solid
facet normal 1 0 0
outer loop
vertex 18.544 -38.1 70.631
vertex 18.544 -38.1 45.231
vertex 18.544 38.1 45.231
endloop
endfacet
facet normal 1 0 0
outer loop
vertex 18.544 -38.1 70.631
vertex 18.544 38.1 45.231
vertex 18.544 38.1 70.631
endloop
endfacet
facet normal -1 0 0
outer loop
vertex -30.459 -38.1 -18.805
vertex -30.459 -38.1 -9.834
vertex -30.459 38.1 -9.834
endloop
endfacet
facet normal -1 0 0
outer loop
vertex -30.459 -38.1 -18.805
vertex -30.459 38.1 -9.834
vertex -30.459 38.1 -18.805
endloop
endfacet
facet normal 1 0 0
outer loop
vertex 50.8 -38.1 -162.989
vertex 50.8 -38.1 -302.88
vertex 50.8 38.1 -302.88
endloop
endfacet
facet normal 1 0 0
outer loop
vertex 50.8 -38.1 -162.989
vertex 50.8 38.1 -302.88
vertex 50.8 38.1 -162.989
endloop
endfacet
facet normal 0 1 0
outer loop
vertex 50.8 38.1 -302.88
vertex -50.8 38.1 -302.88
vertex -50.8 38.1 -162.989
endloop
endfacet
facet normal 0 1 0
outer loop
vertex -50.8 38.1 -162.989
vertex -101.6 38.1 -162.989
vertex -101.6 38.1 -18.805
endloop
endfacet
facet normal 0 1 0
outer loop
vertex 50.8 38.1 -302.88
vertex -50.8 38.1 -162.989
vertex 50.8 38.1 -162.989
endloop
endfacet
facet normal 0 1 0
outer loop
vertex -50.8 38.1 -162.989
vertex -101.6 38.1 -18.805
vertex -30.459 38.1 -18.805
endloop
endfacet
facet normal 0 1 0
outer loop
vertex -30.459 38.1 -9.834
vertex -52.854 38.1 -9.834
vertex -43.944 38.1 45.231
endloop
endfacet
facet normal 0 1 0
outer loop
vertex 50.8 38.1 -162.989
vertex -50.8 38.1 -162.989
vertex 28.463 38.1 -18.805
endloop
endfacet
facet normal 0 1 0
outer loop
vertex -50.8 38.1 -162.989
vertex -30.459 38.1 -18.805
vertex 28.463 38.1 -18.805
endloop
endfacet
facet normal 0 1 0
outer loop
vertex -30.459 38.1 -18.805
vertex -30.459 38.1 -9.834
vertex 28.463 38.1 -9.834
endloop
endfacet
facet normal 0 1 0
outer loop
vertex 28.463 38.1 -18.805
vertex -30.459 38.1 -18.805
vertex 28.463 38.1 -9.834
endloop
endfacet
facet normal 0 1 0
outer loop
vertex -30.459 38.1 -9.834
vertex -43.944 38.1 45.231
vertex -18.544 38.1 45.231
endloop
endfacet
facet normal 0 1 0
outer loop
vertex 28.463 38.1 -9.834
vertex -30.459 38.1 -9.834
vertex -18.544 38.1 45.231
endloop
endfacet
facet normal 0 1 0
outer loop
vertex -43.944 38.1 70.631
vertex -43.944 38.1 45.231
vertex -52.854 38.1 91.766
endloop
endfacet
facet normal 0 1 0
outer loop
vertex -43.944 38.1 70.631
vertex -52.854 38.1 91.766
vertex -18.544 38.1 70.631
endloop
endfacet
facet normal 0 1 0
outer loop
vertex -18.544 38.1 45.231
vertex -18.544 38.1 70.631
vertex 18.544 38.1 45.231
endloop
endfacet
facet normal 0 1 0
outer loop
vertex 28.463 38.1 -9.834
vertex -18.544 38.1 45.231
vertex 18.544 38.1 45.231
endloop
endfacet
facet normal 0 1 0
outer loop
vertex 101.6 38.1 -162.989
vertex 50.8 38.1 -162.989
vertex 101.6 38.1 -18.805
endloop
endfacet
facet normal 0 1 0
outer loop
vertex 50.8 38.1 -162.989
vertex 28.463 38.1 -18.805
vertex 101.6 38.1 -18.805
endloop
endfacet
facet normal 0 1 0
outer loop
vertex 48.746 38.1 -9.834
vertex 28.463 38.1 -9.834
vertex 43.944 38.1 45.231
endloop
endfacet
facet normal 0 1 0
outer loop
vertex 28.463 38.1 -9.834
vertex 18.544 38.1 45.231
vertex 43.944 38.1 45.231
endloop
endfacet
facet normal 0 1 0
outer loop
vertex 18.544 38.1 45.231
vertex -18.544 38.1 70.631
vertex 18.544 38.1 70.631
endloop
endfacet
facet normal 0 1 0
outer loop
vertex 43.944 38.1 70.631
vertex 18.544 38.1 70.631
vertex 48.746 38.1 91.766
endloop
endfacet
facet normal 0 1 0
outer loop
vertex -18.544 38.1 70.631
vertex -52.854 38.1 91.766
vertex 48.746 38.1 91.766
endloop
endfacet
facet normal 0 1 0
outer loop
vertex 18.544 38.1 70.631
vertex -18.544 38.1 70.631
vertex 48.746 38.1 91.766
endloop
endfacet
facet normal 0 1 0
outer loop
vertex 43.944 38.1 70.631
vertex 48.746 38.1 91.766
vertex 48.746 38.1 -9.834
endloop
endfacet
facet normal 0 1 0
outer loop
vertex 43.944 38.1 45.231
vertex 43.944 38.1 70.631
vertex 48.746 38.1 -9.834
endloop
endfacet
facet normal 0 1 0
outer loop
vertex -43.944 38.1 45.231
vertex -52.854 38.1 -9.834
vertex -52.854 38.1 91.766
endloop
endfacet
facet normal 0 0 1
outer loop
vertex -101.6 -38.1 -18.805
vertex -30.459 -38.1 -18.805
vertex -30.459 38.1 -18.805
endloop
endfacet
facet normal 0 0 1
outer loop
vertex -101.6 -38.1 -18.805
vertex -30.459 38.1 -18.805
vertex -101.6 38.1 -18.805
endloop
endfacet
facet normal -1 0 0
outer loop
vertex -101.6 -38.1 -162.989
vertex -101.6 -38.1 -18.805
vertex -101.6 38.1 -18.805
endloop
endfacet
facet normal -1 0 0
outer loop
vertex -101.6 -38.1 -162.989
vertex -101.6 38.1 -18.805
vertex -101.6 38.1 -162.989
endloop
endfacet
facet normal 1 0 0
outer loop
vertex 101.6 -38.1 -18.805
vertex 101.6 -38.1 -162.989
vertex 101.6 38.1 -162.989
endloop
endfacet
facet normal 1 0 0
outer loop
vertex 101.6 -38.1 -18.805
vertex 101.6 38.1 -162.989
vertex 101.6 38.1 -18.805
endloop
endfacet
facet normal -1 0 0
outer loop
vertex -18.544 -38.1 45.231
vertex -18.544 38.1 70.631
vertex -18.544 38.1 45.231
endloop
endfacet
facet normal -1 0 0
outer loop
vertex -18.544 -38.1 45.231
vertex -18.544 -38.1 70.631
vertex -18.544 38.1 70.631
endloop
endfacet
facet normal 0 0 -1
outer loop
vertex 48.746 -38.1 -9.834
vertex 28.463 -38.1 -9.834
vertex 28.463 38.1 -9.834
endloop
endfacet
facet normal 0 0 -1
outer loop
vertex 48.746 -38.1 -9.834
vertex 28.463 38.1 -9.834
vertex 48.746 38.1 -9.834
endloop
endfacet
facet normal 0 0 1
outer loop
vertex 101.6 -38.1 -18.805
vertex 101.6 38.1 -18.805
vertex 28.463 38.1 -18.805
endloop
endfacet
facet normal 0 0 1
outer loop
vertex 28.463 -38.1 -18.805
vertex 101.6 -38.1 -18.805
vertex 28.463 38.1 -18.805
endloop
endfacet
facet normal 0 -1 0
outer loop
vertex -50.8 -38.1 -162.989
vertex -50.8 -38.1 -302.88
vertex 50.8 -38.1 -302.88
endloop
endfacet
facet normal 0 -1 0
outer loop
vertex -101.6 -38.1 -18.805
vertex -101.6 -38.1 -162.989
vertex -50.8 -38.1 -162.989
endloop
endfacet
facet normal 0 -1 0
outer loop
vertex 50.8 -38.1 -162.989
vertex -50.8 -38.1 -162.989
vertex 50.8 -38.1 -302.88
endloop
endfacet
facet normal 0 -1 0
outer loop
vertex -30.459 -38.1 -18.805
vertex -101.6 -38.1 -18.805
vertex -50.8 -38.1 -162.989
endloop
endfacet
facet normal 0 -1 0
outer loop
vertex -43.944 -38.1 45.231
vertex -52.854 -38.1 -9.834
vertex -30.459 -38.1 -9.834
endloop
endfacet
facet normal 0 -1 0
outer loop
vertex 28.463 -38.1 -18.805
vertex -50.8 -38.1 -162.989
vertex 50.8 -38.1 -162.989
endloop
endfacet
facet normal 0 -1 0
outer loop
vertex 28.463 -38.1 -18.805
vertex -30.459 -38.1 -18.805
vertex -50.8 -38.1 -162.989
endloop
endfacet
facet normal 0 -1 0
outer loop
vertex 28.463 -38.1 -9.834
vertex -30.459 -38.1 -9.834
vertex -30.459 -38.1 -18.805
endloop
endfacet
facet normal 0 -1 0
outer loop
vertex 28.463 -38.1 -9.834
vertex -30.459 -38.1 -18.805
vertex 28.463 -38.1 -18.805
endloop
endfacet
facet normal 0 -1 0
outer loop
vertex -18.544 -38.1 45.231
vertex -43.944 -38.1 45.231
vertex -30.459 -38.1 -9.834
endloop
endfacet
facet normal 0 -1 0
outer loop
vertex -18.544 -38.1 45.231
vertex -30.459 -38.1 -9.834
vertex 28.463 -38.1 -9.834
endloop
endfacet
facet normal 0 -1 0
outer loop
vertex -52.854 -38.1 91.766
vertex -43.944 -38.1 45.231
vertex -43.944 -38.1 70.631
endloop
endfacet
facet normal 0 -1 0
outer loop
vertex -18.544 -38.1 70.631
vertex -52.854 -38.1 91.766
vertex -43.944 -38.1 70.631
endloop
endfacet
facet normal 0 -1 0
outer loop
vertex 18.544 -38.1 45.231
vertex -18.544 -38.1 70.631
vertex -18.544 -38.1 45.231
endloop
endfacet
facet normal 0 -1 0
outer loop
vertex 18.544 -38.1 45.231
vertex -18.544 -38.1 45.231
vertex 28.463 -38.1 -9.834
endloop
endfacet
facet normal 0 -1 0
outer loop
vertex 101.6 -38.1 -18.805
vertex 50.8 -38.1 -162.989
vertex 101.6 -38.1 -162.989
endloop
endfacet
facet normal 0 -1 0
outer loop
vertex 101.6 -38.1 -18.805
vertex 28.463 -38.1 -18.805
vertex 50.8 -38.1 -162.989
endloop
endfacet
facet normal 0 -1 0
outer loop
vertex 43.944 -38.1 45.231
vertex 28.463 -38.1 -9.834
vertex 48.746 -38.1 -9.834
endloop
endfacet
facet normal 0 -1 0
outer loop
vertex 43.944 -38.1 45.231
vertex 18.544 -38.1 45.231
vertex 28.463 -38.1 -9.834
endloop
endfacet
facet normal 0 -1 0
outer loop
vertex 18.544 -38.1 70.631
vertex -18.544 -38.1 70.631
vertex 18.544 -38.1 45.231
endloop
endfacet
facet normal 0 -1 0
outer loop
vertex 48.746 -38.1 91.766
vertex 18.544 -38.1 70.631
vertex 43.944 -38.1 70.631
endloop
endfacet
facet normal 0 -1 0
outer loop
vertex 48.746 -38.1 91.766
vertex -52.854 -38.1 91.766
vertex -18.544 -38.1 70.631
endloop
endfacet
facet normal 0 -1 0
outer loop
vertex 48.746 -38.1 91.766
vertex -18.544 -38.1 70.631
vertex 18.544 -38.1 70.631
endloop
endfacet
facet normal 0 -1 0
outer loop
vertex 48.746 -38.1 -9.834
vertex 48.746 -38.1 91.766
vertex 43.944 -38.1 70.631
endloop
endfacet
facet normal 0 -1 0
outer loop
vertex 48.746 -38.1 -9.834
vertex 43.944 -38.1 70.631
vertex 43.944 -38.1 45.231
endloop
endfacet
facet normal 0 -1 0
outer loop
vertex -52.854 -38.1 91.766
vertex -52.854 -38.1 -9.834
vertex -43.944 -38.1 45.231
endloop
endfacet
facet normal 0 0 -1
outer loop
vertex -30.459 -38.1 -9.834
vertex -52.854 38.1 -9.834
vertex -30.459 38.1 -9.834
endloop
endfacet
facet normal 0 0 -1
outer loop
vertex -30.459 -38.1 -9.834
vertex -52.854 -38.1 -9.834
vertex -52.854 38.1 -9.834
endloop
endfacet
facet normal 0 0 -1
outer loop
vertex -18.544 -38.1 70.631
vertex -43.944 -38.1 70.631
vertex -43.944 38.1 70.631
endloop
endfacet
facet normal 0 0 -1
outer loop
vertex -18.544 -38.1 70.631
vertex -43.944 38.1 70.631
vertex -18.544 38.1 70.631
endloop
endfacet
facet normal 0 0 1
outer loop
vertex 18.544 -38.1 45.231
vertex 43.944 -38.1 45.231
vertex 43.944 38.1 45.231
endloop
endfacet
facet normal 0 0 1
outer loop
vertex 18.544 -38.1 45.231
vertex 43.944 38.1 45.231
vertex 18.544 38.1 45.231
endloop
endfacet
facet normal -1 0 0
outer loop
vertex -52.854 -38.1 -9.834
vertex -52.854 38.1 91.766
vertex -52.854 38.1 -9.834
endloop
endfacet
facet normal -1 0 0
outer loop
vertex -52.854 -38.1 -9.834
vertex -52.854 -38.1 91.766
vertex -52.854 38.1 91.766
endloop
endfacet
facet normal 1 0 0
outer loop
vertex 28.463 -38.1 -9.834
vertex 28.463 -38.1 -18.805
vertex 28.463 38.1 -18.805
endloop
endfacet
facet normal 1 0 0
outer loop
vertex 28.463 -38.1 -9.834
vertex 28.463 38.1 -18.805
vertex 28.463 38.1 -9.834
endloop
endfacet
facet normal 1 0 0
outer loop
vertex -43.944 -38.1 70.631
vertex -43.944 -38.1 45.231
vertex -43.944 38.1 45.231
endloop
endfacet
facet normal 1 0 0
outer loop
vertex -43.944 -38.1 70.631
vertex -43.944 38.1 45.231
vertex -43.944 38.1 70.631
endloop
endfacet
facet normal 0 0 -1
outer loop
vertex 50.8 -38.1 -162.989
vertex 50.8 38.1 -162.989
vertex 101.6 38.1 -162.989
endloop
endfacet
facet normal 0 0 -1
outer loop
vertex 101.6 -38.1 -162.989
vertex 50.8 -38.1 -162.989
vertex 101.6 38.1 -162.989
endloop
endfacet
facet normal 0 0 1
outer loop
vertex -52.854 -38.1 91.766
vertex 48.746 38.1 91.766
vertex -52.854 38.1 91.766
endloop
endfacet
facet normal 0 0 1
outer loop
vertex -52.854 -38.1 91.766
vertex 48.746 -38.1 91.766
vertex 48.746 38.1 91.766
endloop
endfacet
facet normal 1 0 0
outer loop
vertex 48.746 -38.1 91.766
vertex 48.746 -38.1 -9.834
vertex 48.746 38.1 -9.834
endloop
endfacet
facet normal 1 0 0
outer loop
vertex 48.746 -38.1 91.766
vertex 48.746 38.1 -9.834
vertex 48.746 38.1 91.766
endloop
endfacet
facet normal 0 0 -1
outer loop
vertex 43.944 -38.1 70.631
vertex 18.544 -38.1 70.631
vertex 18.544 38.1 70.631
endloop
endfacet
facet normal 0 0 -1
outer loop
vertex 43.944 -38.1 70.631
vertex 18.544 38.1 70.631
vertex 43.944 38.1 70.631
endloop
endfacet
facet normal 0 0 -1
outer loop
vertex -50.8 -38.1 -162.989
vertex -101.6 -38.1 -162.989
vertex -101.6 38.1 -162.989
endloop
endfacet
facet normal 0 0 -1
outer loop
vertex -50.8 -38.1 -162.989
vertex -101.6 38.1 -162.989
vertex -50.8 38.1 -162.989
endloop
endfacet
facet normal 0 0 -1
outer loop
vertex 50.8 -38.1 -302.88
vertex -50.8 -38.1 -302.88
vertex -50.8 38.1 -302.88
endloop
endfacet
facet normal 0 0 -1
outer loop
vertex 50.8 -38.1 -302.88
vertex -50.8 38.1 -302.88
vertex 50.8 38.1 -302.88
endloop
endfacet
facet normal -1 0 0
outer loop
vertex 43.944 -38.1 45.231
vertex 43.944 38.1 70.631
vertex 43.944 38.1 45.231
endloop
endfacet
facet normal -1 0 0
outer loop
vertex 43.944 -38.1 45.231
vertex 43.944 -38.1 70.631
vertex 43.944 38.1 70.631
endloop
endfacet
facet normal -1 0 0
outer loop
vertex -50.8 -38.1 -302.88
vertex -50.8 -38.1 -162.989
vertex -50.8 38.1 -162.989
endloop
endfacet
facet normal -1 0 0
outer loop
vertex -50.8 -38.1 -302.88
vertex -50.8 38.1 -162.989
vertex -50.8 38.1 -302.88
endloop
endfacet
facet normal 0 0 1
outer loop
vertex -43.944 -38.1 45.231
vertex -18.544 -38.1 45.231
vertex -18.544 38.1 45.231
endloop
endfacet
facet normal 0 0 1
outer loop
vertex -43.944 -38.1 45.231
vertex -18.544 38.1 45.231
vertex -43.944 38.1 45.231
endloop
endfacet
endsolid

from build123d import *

# Parameters (mm, degrees)
F0_W     = 58.9215288217
F0_H     = 8.9712000314
F0_H_2   = 1.1887999686
F0_W_2   = 50.8
F0_H_3   = 93.8377175136
F0_H_4   = 50.346628223
F0_H_5   = 109.2197667617
F0_H_6   = 30.6704640388
F1_DEPTH = 38.1


with BuildPart() as f1:
    # F0 (on Front) → F1 (new body, symmetric)
    with BuildSketch(Plane.XZ):
        Polygon((-52.8541674206, 65.5549615622), (-52.8541674206, -9.8338549508), (-30.4587072518, -9.8338549508), (28.4628215698, -9.8338549508), (48.7458325794, -9.8338549508), (48.7458325794, 71.4190080762), (33.4042608738, 71.4190080762), (33.4042608738, 75.9503096342), (8.8818948716, 75.9503096342), (8.8818948716, 71.6855600476), (-20.7048710436, 71.6855600476), (-20.7048710436, 79.6819776297), (-47.3596155643, 79.6819776297), (-47.3596155643, 65.5549615622), align=None)
        Polygon((-18.5442172647, 45.2312529087), (-43.9442172647, 45.2312529087), (-43.9442172647, 70.6312529087), (-31.2442172647, 70.6312529087), (-18.5442172647, 70.6312529087), (-18.5442172647, 53.8268759847), align=None, mode=Mode.SUBTRACT)
        Polygon((43.9442172647, 45.2312529087), (18.5442172647, 45.2312529087), (18.5442172647, 70.6312529087), (31.2442172647, 70.6312529087), (43.9442172647, 70.6312529087), (43.9442172647, 53.8268759847), align=None, mode=Mode.SUBTRACT)
        with Locations((-0.997942841, -14.3194549665)):
            Rectangle(F0_W, F0_H)
        Polygon((-52.8541674206, 91.7661450492), (-52.8541674206, 65.5549615622), (-47.3596155643, 65.5549615622), (-47.3596155643, 79.6819776297), (-20.7048710436, 79.6819776297), (-20.7048710436, 71.6855600476), (8.8818948716, 71.6855600476), (8.8818948716, 75.9503096342), (33.4042608738, 75.9503096342), (33.4042608738, 71.4190080762), (48.7458325794, 71.4190080762), (48.7458325794, 91.7661450492), align=None)
        with Locations((-0.997942841, -19.3994549665)):
            Rectangle(F0_W, F0_H_2)
        Polygon((-30.4587072518, -19.9938549508), (-30.4587072518, -18.8050549821), (-50.8, -18.8050549821), (-50.8, -112.6427724957), (-50.8, -162.9894007187), (0, -162.9894007187), (50.8, -162.9894007187), (50.8, -112.6427724957), (50.8, -18.8050549821), (28.4628215698, -18.8050549821), (28.4628215698, -19.9938549508), align=None)
        with Locations((-76.2, -65.7239137389)):
            Rectangle(F0_W_2, F0_H_3)
        Polygon((53.1537466286, -18.8050549821), (50.8, -18.8050549821), (50.8, -112.6427724957), (101.6, -112.6427724957), (101.6, -18.8050549821), align=None)
        with Locations((-76.2, -137.8160866072)):
            Rectangle(F0_W_2, F0_H_4)
        with Locations((76.2, -137.8160866072)):
            Rectangle(F0_W_2, F0_H_4)
        with Locations((-25.4, -217.5992840996)):
            Rectangle(F0_W_2, F0_H_5)
        with Locations((25.4, -217.5992840996)):
            Rectangle(F0_W_2, F0_H_5)
        with Locations((-25.4, -287.5443994999)):
            Rectangle(F0_W_2, F0_H_6)
        with Locations((25.4, -287.5443994999)):
            Rectangle(F0_W_2, F0_H_6)
    extrude(amount=F1_DEPTH, both=True)


solid = f1.part
